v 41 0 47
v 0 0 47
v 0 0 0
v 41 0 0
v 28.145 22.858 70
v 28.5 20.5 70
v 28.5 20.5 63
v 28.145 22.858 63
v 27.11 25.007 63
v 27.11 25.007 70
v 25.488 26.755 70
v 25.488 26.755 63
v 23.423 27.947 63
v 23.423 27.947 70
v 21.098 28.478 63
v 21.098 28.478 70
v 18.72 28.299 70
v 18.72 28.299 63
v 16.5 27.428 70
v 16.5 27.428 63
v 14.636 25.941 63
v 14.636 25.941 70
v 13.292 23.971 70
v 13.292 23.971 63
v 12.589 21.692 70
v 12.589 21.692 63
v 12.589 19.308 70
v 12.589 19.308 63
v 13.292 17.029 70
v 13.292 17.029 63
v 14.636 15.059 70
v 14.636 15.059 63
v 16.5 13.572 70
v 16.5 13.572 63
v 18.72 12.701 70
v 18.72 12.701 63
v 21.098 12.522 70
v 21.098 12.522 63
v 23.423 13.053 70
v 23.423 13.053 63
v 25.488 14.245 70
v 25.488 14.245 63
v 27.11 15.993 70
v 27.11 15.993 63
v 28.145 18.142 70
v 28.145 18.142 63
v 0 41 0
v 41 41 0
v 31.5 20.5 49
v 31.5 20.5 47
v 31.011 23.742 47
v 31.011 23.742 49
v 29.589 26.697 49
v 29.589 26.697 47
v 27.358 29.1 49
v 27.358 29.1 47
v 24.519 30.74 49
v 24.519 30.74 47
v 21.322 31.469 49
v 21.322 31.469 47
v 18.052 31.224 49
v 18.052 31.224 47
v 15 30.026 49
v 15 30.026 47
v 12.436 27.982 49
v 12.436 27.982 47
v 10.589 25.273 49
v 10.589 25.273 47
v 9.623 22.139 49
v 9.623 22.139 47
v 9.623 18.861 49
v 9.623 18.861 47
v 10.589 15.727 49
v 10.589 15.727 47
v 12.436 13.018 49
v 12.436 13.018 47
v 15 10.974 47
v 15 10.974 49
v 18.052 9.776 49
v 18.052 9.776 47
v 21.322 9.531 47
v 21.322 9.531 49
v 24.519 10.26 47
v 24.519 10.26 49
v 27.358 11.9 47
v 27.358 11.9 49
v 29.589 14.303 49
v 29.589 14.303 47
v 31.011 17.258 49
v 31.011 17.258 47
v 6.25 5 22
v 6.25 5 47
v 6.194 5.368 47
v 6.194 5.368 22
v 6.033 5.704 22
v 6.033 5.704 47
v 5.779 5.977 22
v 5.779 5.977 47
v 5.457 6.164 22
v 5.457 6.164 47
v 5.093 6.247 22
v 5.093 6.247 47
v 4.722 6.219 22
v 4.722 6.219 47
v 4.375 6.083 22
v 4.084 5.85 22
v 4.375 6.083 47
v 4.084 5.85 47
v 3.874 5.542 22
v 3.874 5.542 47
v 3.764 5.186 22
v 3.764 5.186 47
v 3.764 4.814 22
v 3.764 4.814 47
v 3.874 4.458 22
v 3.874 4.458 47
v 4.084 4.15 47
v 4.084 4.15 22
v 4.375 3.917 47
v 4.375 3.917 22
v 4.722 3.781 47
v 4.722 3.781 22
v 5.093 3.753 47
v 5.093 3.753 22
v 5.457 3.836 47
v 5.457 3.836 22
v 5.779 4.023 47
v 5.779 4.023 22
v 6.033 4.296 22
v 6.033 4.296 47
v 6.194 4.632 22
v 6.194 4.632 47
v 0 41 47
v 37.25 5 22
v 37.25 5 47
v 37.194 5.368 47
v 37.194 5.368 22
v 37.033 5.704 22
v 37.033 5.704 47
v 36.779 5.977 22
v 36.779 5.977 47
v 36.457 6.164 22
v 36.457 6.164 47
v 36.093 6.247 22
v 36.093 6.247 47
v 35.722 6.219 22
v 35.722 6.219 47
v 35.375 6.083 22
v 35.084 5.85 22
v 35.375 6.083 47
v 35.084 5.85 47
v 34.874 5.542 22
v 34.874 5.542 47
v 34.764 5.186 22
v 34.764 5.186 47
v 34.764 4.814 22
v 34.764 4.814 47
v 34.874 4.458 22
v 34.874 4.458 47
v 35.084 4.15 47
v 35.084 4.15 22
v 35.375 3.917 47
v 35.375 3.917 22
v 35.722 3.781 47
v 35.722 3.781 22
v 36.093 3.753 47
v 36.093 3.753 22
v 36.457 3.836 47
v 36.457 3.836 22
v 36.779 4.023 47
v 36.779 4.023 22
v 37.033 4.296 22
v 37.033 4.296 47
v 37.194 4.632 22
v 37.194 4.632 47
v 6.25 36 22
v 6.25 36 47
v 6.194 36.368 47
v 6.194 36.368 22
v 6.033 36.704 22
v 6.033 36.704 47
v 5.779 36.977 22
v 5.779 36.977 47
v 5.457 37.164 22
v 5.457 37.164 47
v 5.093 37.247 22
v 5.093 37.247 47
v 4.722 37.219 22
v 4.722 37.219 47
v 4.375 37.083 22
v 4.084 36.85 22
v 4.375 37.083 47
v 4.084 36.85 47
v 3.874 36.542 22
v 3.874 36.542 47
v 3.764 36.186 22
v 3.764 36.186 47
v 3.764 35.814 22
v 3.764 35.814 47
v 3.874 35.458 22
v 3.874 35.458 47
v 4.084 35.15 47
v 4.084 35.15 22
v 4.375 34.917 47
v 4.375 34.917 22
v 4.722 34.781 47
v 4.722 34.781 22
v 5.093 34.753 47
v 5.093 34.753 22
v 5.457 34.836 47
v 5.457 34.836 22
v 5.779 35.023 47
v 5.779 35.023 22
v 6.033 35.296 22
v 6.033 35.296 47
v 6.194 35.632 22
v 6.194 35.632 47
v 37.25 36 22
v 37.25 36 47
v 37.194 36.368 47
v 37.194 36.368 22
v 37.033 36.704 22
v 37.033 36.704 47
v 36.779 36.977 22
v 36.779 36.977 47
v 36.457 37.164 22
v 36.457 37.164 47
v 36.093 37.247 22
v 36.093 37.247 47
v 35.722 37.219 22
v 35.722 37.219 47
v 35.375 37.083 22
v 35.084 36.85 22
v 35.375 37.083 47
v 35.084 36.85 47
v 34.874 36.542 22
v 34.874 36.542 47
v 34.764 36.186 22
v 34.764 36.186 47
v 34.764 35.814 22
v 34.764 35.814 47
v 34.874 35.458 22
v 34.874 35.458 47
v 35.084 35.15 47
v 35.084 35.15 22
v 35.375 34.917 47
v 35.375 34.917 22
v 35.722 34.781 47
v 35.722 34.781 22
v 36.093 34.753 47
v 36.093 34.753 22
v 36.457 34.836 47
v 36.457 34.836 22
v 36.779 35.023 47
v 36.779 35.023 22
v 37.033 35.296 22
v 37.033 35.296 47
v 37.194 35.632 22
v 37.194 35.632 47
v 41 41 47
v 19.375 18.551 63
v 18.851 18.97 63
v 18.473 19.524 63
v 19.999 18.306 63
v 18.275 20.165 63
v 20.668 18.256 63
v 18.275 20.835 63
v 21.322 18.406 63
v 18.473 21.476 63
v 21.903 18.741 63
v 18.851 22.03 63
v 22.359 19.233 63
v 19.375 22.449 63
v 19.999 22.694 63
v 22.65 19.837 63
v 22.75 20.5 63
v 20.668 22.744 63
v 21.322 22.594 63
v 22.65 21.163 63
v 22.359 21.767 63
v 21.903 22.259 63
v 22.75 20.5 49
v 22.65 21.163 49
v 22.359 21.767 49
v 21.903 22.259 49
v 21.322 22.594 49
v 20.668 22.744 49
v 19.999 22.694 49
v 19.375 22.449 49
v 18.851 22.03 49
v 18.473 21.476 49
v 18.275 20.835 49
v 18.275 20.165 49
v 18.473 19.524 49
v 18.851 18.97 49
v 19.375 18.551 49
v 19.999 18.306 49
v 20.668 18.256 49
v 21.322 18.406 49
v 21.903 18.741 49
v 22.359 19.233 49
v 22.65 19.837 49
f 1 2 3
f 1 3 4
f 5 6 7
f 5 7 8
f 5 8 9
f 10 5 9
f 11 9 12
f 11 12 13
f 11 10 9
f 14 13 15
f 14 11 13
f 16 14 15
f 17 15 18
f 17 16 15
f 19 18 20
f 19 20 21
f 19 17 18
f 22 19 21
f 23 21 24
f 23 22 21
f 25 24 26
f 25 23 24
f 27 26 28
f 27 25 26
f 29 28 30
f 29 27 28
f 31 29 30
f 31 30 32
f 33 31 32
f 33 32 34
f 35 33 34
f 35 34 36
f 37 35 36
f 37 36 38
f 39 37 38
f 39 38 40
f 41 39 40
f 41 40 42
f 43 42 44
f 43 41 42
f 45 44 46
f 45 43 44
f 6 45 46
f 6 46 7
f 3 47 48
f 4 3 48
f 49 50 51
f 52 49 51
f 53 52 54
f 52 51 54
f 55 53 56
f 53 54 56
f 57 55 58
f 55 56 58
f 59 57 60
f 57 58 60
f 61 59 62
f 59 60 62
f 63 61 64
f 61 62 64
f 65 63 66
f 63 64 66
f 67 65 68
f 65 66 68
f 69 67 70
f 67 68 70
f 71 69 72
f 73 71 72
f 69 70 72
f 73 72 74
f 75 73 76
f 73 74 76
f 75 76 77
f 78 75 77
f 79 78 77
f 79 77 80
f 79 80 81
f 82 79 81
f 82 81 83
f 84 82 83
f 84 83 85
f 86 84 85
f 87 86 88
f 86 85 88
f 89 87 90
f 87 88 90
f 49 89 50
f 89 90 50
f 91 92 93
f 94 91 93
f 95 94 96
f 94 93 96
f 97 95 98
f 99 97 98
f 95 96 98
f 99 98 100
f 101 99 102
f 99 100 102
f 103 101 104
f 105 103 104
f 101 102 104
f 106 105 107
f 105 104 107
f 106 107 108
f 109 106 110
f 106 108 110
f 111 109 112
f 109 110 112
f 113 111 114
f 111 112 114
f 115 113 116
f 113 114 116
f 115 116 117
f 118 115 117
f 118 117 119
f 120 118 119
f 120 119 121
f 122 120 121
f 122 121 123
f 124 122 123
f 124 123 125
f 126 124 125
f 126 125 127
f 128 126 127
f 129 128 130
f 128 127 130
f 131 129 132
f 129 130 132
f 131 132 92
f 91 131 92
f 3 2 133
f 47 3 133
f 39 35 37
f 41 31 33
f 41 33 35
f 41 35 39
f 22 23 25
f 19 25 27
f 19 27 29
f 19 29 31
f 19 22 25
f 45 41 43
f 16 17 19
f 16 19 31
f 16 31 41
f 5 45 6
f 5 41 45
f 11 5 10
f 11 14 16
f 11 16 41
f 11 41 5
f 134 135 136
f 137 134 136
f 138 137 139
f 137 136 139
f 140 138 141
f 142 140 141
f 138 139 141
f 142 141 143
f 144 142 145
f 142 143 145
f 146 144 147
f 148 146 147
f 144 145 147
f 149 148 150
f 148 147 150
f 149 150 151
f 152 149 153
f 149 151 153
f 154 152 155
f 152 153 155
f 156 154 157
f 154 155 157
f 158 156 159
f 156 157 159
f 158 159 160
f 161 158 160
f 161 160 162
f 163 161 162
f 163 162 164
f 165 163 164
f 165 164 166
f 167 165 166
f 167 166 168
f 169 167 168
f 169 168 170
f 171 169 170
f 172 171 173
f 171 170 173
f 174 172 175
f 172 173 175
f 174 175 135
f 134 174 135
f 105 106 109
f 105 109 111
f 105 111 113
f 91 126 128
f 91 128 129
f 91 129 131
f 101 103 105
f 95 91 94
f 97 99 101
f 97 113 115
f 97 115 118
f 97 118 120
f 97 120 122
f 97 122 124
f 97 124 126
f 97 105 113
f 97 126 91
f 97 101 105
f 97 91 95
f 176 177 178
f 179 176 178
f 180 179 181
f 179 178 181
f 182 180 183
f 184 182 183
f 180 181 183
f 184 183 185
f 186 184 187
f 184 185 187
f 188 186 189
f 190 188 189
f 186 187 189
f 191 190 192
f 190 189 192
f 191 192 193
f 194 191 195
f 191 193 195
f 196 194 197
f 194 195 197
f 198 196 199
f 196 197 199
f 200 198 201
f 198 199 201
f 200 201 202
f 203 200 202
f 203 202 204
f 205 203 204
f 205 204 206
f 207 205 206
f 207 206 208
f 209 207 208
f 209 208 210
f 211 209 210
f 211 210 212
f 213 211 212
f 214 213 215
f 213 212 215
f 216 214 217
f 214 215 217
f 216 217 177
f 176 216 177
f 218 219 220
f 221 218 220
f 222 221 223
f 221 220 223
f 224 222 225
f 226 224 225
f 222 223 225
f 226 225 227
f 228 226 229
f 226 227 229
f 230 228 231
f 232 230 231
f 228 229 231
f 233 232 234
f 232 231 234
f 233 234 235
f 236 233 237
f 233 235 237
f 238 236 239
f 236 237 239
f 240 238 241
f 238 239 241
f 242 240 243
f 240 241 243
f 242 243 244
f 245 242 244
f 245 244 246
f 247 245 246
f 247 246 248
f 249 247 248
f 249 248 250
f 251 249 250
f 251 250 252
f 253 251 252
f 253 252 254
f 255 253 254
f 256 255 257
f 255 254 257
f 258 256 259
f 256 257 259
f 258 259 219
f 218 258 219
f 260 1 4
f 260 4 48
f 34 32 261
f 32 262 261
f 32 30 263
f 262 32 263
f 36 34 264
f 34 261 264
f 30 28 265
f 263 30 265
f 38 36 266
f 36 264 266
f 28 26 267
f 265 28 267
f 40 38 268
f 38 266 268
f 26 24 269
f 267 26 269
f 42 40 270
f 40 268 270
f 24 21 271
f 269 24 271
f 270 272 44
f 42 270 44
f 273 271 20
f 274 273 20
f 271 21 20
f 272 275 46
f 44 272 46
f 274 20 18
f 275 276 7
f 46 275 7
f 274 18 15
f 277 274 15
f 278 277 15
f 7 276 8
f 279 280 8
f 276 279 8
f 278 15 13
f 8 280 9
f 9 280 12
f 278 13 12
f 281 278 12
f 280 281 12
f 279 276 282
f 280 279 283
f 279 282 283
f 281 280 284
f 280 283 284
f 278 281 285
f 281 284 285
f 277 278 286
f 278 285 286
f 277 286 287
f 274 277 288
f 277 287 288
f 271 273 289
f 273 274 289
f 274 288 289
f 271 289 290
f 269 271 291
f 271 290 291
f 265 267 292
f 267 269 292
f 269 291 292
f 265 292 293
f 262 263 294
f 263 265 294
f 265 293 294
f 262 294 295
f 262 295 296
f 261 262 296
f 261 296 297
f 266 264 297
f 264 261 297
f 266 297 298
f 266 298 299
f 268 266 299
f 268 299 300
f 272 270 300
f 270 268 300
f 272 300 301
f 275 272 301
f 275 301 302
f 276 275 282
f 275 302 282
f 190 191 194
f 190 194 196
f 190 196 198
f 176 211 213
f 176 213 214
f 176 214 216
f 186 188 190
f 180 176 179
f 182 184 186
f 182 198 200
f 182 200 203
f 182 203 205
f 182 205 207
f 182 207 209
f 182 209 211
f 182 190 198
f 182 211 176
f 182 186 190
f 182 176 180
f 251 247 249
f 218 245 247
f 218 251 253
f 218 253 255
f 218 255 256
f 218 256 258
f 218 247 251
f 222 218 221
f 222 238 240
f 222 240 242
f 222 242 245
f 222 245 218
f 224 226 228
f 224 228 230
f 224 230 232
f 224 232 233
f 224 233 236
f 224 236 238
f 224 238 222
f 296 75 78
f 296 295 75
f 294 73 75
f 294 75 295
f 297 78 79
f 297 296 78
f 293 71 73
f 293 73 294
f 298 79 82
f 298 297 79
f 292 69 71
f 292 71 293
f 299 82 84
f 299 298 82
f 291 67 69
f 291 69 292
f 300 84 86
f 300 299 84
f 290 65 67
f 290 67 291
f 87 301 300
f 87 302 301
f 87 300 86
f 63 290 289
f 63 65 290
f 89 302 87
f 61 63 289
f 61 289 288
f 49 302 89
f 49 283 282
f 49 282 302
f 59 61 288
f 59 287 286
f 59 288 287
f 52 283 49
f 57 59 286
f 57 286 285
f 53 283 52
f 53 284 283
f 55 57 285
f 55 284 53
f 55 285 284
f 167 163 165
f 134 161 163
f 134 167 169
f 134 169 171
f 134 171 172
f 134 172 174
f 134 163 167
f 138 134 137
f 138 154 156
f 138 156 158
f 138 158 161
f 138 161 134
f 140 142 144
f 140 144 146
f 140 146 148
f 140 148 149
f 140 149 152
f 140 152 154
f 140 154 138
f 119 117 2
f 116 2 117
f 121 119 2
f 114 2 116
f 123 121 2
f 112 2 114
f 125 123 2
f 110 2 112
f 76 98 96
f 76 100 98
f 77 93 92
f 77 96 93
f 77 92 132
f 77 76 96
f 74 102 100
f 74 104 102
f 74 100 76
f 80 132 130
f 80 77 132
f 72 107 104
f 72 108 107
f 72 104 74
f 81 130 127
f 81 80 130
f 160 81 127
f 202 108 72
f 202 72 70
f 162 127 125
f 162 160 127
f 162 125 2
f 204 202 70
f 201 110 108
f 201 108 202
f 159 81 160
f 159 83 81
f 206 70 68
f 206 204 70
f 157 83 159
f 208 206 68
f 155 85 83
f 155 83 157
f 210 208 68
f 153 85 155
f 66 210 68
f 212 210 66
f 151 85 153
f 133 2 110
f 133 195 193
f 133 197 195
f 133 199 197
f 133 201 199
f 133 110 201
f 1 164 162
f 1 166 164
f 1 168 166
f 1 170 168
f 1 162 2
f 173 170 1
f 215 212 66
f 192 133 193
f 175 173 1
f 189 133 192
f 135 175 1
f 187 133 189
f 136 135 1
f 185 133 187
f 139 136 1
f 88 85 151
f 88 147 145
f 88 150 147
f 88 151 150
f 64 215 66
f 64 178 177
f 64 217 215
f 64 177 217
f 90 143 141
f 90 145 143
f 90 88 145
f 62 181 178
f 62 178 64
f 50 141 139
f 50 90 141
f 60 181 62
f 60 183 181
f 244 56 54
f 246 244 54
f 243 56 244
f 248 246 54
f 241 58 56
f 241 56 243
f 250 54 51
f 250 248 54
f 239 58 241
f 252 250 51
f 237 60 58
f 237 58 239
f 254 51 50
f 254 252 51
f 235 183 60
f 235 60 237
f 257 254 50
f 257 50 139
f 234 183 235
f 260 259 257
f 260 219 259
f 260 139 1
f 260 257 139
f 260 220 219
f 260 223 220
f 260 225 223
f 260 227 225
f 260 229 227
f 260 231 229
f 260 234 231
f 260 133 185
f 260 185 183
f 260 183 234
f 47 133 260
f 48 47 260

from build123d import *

# Parameters (mm, degrees)
F0_W     = 41
F0_H     = 41
F1_DEPTH = 47
F2_R     = 1.25
F3_DEPTH = 25
F4_R     = 11
F5_DEPTH = 2
F6_R     = 2.25
F7_DEPTH = 21
F8_R     = 8
F9_DEPTH = 7


with BuildPart() as f1:
    # F0 (on Top) → F1 (new body)
    with BuildSketch(Plane.XY):
        with Locations((20.5, 20.5)):
            Rectangle(F0_W, F0_H)
    extrude(amount=F1_DEPTH)

    # F2 (on face) → F3 (cut)
    with BuildSketch(Plane.XY.offset(47)):
        with Locations((5, 5)):
            Circle(F2_R)
        with Locations((36, 5)):
            Circle(F2_R)
        with Locations((36, 36)):
            Circle(F2_R)
        with Locations((5, 36)):
            Circle(F2_R)
    extrude(amount=-F3_DEPTH, mode=Mode.SUBTRACT)

    # F4 (on face) → F5 (join)
    with BuildSketch(Plane.XY.offset(47)):
        with Locations((20.5, 20.5)):
            Circle(F4_R)
    extrude(amount=F5_DEPTH)

    # F6 (on face) → F7 (join)
    with BuildSketch(Plane.XY.offset(49)):
        with Locations((20.5, 20.5)):
            Circle(F6_R)
    extrude(amount=F7_DEPTH)

    # F8 (on face) → F9 (join)
    with BuildSketch(Plane.XY.offset(70)):
        with Locations((20.5, 20.5)):
            Circle(F8_R)
    extrude(amount=-F9_DEPTH)


solid = f1.part
